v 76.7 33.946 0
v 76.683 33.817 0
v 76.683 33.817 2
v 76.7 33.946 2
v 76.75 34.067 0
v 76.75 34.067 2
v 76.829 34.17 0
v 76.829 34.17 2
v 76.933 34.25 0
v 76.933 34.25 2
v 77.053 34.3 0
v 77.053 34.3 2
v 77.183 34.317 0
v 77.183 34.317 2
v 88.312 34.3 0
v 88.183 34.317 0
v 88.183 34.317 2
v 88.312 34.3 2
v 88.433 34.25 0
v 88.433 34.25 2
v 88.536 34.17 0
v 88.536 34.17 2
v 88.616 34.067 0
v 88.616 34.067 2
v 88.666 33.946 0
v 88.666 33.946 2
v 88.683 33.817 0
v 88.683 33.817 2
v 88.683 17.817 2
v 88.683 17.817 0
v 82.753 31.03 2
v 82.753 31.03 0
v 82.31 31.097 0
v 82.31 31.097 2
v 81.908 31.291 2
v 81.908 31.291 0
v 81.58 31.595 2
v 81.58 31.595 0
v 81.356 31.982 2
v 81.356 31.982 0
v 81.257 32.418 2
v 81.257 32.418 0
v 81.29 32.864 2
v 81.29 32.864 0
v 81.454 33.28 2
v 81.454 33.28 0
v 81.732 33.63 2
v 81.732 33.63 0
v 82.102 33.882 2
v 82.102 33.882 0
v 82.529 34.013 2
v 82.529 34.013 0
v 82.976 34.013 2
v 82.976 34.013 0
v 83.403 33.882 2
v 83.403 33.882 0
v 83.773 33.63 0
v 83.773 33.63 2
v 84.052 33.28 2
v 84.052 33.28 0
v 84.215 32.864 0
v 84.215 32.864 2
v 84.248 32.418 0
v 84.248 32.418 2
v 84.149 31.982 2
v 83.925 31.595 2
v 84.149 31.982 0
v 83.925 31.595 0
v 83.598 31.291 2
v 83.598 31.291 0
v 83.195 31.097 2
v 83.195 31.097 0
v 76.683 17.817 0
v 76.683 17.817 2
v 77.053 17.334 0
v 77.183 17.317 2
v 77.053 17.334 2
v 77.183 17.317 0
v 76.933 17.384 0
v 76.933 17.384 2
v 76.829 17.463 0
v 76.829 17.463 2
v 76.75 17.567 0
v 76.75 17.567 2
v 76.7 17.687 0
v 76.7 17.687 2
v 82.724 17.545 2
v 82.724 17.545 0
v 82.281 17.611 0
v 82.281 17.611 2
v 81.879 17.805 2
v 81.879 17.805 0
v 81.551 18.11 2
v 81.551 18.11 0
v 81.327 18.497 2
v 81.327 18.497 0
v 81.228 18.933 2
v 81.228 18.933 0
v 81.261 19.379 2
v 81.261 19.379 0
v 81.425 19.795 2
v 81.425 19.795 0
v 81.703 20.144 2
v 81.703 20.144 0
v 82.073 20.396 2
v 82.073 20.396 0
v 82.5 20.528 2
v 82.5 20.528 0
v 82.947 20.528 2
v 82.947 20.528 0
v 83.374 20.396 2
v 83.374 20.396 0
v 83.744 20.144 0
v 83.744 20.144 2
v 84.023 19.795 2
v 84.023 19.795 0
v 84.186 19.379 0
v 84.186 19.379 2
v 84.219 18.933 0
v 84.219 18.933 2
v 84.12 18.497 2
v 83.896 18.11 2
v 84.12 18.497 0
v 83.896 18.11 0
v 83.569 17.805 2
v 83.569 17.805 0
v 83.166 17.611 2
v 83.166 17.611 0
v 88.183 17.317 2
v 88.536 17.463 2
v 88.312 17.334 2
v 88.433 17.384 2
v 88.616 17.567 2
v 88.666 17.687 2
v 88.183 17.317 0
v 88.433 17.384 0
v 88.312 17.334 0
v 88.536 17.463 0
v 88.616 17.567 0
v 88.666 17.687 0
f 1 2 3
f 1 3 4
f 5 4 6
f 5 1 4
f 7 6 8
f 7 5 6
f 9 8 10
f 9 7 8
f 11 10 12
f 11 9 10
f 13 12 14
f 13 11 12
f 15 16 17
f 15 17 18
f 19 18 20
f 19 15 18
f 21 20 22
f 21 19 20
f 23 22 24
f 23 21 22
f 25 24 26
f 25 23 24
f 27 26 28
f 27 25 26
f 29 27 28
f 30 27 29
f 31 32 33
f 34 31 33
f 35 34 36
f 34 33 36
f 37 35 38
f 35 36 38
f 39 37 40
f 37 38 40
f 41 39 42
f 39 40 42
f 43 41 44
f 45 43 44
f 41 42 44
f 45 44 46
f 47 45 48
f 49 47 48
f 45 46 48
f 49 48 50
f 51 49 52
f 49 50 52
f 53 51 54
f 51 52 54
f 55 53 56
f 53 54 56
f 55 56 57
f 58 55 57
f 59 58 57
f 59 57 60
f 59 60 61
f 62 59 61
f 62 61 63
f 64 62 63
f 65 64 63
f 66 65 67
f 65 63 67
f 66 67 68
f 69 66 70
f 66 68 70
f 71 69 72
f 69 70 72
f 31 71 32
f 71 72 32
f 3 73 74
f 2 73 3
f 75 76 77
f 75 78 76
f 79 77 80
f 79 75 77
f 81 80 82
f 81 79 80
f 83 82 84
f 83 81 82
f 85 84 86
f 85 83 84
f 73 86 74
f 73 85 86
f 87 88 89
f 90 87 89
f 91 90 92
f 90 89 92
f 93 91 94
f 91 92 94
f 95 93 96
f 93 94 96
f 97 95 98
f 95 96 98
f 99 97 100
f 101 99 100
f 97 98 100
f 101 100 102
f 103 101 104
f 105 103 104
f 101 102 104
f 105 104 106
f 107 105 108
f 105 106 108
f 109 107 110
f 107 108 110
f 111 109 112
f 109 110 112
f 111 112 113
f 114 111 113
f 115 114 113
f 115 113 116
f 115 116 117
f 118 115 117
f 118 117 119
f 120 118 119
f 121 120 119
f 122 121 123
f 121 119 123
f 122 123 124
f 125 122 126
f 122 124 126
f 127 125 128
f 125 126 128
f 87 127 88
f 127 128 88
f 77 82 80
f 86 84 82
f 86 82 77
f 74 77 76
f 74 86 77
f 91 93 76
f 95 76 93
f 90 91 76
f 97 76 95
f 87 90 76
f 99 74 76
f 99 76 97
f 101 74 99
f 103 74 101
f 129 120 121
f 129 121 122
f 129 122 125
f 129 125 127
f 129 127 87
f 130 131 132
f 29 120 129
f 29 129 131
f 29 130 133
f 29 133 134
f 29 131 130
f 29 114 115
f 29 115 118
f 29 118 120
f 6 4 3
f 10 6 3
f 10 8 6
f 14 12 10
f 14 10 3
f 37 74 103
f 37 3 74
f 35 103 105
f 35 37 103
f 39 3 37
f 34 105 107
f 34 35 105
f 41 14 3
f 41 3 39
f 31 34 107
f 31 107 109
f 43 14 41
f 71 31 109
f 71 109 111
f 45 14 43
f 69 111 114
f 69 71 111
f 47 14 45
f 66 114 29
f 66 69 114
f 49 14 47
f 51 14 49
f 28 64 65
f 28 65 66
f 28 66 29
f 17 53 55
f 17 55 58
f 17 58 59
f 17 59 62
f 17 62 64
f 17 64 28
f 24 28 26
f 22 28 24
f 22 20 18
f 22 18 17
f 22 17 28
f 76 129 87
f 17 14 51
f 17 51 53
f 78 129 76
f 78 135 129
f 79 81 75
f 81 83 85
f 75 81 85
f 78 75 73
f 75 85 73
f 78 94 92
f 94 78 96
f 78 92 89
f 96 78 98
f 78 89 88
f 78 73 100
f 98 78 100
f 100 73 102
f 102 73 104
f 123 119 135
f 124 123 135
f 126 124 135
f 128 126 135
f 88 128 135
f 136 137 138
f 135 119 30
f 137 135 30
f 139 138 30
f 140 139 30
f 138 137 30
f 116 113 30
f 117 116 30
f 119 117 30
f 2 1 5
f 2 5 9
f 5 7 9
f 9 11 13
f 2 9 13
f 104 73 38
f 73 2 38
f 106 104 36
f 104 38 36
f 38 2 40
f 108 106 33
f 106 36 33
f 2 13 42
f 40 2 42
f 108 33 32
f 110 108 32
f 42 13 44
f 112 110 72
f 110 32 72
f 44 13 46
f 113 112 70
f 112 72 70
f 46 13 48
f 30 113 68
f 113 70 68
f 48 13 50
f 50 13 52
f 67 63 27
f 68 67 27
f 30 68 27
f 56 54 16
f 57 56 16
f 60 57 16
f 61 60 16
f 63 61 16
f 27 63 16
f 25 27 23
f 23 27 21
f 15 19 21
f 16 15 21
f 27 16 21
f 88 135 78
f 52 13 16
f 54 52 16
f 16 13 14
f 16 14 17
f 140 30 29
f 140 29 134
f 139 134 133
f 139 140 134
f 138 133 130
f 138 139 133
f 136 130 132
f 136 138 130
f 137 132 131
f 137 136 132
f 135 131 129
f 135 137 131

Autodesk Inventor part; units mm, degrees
ref_plane "YZ Plane" through (0, 0, 0) normal (1, 0, 0) x (0, 1, 0)
ref_plane "XZ Plane" through (0, 0, 0) normal (0, 1, 0) x (-1, 0, 0)
ref_plane "XY Plane" through (0, 0, 0) normal (0, 0, 1) x (1, 0, 0)
sketch "Sketch1" plane through (0, 0, 0) normal (0, 0, 1) x (1, 0, 0)
  line L0 (77.1826, 34.3167) -> (88.1826, 34.3167)
  line L1 (88.6826, 33.8167) -> (88.6826, 17.8167)
  line L2 (88.1826, 17.3167) -> (77.1826, 17.3167)
  line L3 (76.6826, 17.8167) -> (76.6826, 33.8167)
  arc A0 (77.1826, 34.3167) -> (76.6826, 33.8167) centre (77.1826, 33.8167) ccw
  arc A1 (88.6826, 33.8167) -> (88.1826, 34.3167) centre (88.1826, 33.8167) ccw
  arc A2 (88.1826, 17.3167) -> (88.6826, 17.8167) centre (88.1826, 17.8167) ccw
  arc A3 (76.6826, 17.8167) -> (77.1826, 17.3167) centre (77.1826, 17.8167) ccw
  line L4 (82.4065, 34.3167) -> (82.6826, 17.3167)
  point P0 (0, 0)
  point P1 (88.6826, 17.3167)
  point P2 (88.6826, 34.3167)
  point P3 (76.6826, 17.3167)
  dimension "d0" = 12
  dimension "d1" = 17
  dimension "d2" = 0.5
extrude "Extrusion1" add sketch "Sketch1" along normal blind 2
sketch "Sketch2" plane through (0, 0, 2) normal (0, 0, 1) x (1, 0, 0)
  point P0 (0, 0)
  point P1 (82.7526, 32.5302)
hole "Hole1" at (82.7526, 32.5302, 2) direction (0, 0, -1) diameter 3 depth 55.5
sketch "Sketch3" plane through (0, 0, 2) normal (0, 0, 1) x (1, 0, 0)
  point P0 (0, 0)
  point P1 (82.7236, 19.0448)
hole "Hole2" at (82.7236, 19.0448, 2) direction (0, 0, -1) diameter 3 depth 55.5
sketch "Sketch5" plane through (0, 0, 0) normal (0, 0, 1) x (1, 0, 0)
  line L0 (88.1826, 34.3167) -> (77.1826, 34.3167) projected
  line L1 (77.1826, 17.3167) -> (88.1826, 17.3167) projected
  line L2 (83.824, 30.7891) -> (81.5769, 30.7891) construction
  line L3 (81.5769, 30.7891) -> (81.5769, 20.7942) construction
  line L4 (81.5769, 20.7942) -> (83.824, 20.7942) construction
  line L5 (83.824, 20.7942) -> (83.824, 30.7891) construction
  point P0 (0, 0)
properties part number "termo" material "Wood (Oak)"
